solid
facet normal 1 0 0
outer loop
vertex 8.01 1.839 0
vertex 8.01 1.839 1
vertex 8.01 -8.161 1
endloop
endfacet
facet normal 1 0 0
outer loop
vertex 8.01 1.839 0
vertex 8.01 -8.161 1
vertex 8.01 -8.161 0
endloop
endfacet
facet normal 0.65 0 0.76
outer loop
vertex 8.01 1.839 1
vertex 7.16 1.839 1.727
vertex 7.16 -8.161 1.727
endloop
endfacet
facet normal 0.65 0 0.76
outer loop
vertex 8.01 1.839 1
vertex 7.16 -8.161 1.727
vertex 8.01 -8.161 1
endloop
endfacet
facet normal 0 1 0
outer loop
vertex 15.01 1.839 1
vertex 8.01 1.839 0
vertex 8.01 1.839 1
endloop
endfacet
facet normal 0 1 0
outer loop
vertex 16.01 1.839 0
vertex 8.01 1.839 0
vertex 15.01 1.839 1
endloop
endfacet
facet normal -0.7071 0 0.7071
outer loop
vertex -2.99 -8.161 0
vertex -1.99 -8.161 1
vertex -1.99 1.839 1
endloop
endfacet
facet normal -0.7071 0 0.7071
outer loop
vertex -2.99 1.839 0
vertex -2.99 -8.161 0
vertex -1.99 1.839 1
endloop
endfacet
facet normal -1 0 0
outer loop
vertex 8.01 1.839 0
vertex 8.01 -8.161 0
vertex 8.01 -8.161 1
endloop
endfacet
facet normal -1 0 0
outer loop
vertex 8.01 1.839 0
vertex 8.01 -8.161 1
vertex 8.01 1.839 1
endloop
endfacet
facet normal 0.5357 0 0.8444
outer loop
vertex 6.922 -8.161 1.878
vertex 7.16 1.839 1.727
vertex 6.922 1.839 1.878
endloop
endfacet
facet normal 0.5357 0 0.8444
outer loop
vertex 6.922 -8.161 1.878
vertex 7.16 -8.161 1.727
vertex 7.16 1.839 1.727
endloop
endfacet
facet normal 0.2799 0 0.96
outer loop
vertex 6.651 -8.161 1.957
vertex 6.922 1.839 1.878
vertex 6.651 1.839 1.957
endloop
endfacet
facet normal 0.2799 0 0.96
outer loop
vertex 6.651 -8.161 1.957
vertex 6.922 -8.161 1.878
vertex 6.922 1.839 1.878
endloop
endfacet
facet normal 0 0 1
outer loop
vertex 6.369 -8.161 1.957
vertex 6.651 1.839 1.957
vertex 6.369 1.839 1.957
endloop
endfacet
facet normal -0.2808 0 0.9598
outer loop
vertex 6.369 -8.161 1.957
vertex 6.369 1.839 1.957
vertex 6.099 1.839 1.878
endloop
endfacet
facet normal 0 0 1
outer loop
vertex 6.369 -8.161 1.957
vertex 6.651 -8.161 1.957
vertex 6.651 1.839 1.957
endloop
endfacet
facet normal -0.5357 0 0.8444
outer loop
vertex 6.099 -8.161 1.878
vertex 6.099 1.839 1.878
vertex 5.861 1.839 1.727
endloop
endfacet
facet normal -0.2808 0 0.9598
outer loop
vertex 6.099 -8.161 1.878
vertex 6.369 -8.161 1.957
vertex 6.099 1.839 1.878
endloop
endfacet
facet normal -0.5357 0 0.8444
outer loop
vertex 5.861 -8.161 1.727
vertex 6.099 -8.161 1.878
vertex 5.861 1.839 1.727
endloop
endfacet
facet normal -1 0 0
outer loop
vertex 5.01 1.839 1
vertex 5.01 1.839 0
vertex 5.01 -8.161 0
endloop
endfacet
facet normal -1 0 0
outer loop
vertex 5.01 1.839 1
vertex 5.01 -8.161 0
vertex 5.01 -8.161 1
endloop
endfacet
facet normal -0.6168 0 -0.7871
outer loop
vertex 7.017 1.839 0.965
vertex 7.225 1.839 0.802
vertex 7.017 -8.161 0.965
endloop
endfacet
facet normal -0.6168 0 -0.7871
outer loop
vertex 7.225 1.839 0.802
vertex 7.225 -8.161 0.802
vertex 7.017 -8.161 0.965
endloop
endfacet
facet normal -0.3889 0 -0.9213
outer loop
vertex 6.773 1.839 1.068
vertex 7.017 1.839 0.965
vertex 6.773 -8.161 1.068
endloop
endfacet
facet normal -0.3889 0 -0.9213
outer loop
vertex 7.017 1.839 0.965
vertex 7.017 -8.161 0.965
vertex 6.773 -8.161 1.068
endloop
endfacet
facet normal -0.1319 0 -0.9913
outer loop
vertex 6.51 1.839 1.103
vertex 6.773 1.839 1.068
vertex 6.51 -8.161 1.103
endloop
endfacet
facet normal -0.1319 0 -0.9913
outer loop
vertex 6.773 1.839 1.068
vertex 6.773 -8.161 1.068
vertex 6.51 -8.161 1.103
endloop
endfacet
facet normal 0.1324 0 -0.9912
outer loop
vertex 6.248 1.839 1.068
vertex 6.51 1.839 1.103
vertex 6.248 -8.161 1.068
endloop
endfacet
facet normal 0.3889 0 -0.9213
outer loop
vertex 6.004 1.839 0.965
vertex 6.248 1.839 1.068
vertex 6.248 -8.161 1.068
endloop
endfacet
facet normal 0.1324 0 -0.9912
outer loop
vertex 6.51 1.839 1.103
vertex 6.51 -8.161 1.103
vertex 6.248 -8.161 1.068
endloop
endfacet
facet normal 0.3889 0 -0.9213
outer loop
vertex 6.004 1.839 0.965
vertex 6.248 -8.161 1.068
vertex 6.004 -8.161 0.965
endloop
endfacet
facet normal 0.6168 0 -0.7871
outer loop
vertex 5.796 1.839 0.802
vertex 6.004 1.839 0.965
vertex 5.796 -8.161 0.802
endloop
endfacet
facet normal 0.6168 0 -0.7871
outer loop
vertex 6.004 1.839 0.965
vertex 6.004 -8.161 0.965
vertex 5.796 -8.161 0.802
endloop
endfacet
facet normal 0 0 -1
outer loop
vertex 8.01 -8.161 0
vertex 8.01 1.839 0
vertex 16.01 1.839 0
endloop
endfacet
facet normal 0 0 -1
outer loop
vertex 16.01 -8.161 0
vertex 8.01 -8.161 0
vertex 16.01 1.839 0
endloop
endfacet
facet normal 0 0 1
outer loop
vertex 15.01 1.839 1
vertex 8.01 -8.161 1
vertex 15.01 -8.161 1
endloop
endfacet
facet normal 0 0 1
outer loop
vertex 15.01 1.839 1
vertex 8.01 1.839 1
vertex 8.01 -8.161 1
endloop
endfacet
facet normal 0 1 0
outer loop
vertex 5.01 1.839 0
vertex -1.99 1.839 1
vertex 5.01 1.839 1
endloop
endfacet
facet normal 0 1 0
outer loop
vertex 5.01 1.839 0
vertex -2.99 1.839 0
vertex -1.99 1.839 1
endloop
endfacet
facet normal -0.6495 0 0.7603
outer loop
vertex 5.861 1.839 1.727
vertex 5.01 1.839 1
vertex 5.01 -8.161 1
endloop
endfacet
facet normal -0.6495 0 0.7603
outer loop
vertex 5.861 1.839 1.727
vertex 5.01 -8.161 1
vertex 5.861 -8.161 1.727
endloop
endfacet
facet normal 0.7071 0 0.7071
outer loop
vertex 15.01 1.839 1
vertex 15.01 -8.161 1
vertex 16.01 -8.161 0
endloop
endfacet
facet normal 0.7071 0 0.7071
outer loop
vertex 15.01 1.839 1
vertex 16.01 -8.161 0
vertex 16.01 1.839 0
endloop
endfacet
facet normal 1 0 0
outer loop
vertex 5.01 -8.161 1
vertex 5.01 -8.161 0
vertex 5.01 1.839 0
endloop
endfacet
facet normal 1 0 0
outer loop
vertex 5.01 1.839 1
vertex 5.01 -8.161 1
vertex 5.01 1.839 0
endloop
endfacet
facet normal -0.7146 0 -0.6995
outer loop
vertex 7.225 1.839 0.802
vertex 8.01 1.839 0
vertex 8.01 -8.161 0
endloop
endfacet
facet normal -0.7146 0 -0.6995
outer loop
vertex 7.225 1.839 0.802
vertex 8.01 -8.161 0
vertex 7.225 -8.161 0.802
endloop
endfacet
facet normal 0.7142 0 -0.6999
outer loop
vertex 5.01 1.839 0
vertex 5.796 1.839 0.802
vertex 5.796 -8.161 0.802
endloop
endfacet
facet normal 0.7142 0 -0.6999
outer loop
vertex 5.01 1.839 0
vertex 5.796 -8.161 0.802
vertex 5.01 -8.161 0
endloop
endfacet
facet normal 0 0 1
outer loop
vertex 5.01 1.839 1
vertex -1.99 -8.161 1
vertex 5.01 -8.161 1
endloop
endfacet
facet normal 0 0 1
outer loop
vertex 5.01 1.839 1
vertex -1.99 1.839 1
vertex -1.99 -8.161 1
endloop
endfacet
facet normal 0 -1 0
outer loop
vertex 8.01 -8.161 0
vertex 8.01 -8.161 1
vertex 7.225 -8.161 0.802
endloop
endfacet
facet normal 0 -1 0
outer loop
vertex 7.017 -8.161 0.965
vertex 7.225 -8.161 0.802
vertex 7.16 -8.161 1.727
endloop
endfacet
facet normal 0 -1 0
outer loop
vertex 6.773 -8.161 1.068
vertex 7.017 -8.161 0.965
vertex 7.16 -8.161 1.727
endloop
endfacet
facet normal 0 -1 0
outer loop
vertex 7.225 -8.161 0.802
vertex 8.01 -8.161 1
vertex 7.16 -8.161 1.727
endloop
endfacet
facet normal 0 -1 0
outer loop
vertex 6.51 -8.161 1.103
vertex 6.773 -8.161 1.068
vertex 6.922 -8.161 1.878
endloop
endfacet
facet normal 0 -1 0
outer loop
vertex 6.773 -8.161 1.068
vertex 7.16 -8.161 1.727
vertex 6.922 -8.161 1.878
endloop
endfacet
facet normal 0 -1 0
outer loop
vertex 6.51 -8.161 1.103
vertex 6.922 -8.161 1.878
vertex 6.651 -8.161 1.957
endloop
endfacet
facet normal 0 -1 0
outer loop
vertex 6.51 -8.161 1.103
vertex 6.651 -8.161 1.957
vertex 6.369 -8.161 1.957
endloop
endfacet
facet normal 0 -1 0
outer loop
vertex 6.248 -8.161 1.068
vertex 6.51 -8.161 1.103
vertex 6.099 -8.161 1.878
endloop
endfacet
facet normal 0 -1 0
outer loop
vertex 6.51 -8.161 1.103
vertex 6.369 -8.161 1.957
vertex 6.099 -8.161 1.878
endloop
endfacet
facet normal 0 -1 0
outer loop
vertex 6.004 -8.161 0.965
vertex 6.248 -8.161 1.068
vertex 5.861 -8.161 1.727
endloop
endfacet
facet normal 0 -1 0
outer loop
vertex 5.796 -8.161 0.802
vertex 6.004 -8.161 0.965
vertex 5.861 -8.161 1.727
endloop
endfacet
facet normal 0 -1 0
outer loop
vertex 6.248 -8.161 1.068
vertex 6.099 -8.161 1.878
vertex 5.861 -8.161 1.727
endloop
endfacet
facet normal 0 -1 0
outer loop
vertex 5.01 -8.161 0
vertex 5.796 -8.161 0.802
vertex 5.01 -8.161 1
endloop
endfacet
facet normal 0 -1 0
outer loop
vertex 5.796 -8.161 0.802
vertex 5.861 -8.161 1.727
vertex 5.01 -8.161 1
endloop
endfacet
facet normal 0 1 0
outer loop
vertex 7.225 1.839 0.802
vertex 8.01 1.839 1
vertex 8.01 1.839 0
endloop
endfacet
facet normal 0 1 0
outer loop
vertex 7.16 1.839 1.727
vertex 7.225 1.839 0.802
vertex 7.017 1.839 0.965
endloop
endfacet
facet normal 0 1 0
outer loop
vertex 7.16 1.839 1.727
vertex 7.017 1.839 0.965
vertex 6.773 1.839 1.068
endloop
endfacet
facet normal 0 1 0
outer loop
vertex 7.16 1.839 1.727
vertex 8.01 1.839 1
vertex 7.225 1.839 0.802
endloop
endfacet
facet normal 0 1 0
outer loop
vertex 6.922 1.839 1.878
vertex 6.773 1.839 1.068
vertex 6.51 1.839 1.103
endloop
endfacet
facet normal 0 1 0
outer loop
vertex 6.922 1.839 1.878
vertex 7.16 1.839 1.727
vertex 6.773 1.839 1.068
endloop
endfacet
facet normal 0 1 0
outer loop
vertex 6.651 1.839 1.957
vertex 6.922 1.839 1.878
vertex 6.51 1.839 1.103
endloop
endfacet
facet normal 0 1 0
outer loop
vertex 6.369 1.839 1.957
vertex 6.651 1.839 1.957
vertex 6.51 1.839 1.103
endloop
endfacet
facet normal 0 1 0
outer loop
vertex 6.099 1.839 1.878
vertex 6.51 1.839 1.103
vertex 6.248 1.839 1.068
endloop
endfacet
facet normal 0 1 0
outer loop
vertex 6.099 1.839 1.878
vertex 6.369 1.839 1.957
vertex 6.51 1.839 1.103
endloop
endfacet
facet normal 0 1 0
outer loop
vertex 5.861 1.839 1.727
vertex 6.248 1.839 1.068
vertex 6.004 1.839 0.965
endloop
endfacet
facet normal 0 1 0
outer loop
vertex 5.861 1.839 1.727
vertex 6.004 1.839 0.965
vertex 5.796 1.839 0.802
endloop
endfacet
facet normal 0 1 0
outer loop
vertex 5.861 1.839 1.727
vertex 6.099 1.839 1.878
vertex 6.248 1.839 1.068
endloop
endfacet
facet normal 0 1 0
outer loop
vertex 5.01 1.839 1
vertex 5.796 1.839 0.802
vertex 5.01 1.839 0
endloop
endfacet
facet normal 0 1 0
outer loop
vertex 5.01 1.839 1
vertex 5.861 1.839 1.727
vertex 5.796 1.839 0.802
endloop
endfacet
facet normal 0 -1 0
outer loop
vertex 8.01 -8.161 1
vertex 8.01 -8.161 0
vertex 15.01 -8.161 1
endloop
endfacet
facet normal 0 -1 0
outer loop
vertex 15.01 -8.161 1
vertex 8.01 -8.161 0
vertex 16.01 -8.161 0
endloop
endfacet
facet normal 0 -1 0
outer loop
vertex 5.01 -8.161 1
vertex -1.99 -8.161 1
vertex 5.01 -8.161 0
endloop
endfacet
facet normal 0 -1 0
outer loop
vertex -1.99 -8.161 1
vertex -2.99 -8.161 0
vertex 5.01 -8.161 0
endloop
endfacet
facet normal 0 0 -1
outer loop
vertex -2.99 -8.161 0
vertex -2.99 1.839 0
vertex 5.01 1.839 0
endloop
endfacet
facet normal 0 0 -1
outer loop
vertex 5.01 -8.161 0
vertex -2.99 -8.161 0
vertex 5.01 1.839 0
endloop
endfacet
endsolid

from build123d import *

# Parameters (mm, degrees)
F0_W      = 8
F0_H      = 10
F1_DEPTH  = 1
F3_DEPTH  = 10
F4_R      = 1
F5_SIZE   = 0.99999
F5_2_SIZE = 0.99999


# Not quite as in the source:
# - a fillet or chamfer is up to 0.001 mm smaller than in the source, because OpenCascade refuses the exact size


with BuildPart() as f1:
    # F0 (on Top) → F1 (new body)
    with BuildSketch(Plane.XY):
        with Locations((12.0103892572, -3.1608146429)):
            Rectangle(F0_W, F0_H)
    extrude(amount=F1_DEPTH)

    # F5#2 (size 1 in the source; OpenCascade refuses exactly that, so slightly less here)
    f5_2_edges = [f1.edges().sort_by_distance(p)[0] for p in [
        (16.010389, -3.160815, 1),
    ]]
    chamfer(f5_2_edges, length=F5_2_SIZE)


with BuildPart() as f1b:
    # F0 (on Top) → F1, piece 2 (new body)
    with BuildSketch(Plane.XY):
        with Locations((1.0103892572, -3.1608146429)):
            Rectangle(F0_W, F0_H)
    extrude(amount=F1_DEPTH)

    # F5 (size 1 in the source; OpenCascade refuses exactly that, so slightly less here)
    f5_edges = [f1b.edges().sort_by_distance(p)[0] for p in [
        (-2.989611, -3.160815, 1),
    ]]
    chamfer(f5_edges, length=F5_SIZE)


with BuildPart() as f3:
    # F2 (on face) → F3 (new body, through all)
    with BuildSketch(Plane(origin=(0, 1.8391853571, 0), x_dir=(-1, 0, 0), z_dir=(0, 1, 0))):
        Polygon((-6.5103892572, 2.2825093409), (-8.0103892572, 1), (-8.0103892572, 0), (-6.5103892572, 1.5325093409), (-5.0103892572, 0), (-5.0103892572, 1), align=None)
    extrude(amount=-F3_DEPTH)

    # F4
    f4_edges = [f3.edges().sort_by_distance(p)[0] for p in [
        (6.510389, -3.160815, 1.532509),
        (6.510389, -3.160815, 2.282509),
    ]]
    fillet(f4_edges, radius=F4_R)


solid = Compound([f1.part, f1b.part, f3.part])
